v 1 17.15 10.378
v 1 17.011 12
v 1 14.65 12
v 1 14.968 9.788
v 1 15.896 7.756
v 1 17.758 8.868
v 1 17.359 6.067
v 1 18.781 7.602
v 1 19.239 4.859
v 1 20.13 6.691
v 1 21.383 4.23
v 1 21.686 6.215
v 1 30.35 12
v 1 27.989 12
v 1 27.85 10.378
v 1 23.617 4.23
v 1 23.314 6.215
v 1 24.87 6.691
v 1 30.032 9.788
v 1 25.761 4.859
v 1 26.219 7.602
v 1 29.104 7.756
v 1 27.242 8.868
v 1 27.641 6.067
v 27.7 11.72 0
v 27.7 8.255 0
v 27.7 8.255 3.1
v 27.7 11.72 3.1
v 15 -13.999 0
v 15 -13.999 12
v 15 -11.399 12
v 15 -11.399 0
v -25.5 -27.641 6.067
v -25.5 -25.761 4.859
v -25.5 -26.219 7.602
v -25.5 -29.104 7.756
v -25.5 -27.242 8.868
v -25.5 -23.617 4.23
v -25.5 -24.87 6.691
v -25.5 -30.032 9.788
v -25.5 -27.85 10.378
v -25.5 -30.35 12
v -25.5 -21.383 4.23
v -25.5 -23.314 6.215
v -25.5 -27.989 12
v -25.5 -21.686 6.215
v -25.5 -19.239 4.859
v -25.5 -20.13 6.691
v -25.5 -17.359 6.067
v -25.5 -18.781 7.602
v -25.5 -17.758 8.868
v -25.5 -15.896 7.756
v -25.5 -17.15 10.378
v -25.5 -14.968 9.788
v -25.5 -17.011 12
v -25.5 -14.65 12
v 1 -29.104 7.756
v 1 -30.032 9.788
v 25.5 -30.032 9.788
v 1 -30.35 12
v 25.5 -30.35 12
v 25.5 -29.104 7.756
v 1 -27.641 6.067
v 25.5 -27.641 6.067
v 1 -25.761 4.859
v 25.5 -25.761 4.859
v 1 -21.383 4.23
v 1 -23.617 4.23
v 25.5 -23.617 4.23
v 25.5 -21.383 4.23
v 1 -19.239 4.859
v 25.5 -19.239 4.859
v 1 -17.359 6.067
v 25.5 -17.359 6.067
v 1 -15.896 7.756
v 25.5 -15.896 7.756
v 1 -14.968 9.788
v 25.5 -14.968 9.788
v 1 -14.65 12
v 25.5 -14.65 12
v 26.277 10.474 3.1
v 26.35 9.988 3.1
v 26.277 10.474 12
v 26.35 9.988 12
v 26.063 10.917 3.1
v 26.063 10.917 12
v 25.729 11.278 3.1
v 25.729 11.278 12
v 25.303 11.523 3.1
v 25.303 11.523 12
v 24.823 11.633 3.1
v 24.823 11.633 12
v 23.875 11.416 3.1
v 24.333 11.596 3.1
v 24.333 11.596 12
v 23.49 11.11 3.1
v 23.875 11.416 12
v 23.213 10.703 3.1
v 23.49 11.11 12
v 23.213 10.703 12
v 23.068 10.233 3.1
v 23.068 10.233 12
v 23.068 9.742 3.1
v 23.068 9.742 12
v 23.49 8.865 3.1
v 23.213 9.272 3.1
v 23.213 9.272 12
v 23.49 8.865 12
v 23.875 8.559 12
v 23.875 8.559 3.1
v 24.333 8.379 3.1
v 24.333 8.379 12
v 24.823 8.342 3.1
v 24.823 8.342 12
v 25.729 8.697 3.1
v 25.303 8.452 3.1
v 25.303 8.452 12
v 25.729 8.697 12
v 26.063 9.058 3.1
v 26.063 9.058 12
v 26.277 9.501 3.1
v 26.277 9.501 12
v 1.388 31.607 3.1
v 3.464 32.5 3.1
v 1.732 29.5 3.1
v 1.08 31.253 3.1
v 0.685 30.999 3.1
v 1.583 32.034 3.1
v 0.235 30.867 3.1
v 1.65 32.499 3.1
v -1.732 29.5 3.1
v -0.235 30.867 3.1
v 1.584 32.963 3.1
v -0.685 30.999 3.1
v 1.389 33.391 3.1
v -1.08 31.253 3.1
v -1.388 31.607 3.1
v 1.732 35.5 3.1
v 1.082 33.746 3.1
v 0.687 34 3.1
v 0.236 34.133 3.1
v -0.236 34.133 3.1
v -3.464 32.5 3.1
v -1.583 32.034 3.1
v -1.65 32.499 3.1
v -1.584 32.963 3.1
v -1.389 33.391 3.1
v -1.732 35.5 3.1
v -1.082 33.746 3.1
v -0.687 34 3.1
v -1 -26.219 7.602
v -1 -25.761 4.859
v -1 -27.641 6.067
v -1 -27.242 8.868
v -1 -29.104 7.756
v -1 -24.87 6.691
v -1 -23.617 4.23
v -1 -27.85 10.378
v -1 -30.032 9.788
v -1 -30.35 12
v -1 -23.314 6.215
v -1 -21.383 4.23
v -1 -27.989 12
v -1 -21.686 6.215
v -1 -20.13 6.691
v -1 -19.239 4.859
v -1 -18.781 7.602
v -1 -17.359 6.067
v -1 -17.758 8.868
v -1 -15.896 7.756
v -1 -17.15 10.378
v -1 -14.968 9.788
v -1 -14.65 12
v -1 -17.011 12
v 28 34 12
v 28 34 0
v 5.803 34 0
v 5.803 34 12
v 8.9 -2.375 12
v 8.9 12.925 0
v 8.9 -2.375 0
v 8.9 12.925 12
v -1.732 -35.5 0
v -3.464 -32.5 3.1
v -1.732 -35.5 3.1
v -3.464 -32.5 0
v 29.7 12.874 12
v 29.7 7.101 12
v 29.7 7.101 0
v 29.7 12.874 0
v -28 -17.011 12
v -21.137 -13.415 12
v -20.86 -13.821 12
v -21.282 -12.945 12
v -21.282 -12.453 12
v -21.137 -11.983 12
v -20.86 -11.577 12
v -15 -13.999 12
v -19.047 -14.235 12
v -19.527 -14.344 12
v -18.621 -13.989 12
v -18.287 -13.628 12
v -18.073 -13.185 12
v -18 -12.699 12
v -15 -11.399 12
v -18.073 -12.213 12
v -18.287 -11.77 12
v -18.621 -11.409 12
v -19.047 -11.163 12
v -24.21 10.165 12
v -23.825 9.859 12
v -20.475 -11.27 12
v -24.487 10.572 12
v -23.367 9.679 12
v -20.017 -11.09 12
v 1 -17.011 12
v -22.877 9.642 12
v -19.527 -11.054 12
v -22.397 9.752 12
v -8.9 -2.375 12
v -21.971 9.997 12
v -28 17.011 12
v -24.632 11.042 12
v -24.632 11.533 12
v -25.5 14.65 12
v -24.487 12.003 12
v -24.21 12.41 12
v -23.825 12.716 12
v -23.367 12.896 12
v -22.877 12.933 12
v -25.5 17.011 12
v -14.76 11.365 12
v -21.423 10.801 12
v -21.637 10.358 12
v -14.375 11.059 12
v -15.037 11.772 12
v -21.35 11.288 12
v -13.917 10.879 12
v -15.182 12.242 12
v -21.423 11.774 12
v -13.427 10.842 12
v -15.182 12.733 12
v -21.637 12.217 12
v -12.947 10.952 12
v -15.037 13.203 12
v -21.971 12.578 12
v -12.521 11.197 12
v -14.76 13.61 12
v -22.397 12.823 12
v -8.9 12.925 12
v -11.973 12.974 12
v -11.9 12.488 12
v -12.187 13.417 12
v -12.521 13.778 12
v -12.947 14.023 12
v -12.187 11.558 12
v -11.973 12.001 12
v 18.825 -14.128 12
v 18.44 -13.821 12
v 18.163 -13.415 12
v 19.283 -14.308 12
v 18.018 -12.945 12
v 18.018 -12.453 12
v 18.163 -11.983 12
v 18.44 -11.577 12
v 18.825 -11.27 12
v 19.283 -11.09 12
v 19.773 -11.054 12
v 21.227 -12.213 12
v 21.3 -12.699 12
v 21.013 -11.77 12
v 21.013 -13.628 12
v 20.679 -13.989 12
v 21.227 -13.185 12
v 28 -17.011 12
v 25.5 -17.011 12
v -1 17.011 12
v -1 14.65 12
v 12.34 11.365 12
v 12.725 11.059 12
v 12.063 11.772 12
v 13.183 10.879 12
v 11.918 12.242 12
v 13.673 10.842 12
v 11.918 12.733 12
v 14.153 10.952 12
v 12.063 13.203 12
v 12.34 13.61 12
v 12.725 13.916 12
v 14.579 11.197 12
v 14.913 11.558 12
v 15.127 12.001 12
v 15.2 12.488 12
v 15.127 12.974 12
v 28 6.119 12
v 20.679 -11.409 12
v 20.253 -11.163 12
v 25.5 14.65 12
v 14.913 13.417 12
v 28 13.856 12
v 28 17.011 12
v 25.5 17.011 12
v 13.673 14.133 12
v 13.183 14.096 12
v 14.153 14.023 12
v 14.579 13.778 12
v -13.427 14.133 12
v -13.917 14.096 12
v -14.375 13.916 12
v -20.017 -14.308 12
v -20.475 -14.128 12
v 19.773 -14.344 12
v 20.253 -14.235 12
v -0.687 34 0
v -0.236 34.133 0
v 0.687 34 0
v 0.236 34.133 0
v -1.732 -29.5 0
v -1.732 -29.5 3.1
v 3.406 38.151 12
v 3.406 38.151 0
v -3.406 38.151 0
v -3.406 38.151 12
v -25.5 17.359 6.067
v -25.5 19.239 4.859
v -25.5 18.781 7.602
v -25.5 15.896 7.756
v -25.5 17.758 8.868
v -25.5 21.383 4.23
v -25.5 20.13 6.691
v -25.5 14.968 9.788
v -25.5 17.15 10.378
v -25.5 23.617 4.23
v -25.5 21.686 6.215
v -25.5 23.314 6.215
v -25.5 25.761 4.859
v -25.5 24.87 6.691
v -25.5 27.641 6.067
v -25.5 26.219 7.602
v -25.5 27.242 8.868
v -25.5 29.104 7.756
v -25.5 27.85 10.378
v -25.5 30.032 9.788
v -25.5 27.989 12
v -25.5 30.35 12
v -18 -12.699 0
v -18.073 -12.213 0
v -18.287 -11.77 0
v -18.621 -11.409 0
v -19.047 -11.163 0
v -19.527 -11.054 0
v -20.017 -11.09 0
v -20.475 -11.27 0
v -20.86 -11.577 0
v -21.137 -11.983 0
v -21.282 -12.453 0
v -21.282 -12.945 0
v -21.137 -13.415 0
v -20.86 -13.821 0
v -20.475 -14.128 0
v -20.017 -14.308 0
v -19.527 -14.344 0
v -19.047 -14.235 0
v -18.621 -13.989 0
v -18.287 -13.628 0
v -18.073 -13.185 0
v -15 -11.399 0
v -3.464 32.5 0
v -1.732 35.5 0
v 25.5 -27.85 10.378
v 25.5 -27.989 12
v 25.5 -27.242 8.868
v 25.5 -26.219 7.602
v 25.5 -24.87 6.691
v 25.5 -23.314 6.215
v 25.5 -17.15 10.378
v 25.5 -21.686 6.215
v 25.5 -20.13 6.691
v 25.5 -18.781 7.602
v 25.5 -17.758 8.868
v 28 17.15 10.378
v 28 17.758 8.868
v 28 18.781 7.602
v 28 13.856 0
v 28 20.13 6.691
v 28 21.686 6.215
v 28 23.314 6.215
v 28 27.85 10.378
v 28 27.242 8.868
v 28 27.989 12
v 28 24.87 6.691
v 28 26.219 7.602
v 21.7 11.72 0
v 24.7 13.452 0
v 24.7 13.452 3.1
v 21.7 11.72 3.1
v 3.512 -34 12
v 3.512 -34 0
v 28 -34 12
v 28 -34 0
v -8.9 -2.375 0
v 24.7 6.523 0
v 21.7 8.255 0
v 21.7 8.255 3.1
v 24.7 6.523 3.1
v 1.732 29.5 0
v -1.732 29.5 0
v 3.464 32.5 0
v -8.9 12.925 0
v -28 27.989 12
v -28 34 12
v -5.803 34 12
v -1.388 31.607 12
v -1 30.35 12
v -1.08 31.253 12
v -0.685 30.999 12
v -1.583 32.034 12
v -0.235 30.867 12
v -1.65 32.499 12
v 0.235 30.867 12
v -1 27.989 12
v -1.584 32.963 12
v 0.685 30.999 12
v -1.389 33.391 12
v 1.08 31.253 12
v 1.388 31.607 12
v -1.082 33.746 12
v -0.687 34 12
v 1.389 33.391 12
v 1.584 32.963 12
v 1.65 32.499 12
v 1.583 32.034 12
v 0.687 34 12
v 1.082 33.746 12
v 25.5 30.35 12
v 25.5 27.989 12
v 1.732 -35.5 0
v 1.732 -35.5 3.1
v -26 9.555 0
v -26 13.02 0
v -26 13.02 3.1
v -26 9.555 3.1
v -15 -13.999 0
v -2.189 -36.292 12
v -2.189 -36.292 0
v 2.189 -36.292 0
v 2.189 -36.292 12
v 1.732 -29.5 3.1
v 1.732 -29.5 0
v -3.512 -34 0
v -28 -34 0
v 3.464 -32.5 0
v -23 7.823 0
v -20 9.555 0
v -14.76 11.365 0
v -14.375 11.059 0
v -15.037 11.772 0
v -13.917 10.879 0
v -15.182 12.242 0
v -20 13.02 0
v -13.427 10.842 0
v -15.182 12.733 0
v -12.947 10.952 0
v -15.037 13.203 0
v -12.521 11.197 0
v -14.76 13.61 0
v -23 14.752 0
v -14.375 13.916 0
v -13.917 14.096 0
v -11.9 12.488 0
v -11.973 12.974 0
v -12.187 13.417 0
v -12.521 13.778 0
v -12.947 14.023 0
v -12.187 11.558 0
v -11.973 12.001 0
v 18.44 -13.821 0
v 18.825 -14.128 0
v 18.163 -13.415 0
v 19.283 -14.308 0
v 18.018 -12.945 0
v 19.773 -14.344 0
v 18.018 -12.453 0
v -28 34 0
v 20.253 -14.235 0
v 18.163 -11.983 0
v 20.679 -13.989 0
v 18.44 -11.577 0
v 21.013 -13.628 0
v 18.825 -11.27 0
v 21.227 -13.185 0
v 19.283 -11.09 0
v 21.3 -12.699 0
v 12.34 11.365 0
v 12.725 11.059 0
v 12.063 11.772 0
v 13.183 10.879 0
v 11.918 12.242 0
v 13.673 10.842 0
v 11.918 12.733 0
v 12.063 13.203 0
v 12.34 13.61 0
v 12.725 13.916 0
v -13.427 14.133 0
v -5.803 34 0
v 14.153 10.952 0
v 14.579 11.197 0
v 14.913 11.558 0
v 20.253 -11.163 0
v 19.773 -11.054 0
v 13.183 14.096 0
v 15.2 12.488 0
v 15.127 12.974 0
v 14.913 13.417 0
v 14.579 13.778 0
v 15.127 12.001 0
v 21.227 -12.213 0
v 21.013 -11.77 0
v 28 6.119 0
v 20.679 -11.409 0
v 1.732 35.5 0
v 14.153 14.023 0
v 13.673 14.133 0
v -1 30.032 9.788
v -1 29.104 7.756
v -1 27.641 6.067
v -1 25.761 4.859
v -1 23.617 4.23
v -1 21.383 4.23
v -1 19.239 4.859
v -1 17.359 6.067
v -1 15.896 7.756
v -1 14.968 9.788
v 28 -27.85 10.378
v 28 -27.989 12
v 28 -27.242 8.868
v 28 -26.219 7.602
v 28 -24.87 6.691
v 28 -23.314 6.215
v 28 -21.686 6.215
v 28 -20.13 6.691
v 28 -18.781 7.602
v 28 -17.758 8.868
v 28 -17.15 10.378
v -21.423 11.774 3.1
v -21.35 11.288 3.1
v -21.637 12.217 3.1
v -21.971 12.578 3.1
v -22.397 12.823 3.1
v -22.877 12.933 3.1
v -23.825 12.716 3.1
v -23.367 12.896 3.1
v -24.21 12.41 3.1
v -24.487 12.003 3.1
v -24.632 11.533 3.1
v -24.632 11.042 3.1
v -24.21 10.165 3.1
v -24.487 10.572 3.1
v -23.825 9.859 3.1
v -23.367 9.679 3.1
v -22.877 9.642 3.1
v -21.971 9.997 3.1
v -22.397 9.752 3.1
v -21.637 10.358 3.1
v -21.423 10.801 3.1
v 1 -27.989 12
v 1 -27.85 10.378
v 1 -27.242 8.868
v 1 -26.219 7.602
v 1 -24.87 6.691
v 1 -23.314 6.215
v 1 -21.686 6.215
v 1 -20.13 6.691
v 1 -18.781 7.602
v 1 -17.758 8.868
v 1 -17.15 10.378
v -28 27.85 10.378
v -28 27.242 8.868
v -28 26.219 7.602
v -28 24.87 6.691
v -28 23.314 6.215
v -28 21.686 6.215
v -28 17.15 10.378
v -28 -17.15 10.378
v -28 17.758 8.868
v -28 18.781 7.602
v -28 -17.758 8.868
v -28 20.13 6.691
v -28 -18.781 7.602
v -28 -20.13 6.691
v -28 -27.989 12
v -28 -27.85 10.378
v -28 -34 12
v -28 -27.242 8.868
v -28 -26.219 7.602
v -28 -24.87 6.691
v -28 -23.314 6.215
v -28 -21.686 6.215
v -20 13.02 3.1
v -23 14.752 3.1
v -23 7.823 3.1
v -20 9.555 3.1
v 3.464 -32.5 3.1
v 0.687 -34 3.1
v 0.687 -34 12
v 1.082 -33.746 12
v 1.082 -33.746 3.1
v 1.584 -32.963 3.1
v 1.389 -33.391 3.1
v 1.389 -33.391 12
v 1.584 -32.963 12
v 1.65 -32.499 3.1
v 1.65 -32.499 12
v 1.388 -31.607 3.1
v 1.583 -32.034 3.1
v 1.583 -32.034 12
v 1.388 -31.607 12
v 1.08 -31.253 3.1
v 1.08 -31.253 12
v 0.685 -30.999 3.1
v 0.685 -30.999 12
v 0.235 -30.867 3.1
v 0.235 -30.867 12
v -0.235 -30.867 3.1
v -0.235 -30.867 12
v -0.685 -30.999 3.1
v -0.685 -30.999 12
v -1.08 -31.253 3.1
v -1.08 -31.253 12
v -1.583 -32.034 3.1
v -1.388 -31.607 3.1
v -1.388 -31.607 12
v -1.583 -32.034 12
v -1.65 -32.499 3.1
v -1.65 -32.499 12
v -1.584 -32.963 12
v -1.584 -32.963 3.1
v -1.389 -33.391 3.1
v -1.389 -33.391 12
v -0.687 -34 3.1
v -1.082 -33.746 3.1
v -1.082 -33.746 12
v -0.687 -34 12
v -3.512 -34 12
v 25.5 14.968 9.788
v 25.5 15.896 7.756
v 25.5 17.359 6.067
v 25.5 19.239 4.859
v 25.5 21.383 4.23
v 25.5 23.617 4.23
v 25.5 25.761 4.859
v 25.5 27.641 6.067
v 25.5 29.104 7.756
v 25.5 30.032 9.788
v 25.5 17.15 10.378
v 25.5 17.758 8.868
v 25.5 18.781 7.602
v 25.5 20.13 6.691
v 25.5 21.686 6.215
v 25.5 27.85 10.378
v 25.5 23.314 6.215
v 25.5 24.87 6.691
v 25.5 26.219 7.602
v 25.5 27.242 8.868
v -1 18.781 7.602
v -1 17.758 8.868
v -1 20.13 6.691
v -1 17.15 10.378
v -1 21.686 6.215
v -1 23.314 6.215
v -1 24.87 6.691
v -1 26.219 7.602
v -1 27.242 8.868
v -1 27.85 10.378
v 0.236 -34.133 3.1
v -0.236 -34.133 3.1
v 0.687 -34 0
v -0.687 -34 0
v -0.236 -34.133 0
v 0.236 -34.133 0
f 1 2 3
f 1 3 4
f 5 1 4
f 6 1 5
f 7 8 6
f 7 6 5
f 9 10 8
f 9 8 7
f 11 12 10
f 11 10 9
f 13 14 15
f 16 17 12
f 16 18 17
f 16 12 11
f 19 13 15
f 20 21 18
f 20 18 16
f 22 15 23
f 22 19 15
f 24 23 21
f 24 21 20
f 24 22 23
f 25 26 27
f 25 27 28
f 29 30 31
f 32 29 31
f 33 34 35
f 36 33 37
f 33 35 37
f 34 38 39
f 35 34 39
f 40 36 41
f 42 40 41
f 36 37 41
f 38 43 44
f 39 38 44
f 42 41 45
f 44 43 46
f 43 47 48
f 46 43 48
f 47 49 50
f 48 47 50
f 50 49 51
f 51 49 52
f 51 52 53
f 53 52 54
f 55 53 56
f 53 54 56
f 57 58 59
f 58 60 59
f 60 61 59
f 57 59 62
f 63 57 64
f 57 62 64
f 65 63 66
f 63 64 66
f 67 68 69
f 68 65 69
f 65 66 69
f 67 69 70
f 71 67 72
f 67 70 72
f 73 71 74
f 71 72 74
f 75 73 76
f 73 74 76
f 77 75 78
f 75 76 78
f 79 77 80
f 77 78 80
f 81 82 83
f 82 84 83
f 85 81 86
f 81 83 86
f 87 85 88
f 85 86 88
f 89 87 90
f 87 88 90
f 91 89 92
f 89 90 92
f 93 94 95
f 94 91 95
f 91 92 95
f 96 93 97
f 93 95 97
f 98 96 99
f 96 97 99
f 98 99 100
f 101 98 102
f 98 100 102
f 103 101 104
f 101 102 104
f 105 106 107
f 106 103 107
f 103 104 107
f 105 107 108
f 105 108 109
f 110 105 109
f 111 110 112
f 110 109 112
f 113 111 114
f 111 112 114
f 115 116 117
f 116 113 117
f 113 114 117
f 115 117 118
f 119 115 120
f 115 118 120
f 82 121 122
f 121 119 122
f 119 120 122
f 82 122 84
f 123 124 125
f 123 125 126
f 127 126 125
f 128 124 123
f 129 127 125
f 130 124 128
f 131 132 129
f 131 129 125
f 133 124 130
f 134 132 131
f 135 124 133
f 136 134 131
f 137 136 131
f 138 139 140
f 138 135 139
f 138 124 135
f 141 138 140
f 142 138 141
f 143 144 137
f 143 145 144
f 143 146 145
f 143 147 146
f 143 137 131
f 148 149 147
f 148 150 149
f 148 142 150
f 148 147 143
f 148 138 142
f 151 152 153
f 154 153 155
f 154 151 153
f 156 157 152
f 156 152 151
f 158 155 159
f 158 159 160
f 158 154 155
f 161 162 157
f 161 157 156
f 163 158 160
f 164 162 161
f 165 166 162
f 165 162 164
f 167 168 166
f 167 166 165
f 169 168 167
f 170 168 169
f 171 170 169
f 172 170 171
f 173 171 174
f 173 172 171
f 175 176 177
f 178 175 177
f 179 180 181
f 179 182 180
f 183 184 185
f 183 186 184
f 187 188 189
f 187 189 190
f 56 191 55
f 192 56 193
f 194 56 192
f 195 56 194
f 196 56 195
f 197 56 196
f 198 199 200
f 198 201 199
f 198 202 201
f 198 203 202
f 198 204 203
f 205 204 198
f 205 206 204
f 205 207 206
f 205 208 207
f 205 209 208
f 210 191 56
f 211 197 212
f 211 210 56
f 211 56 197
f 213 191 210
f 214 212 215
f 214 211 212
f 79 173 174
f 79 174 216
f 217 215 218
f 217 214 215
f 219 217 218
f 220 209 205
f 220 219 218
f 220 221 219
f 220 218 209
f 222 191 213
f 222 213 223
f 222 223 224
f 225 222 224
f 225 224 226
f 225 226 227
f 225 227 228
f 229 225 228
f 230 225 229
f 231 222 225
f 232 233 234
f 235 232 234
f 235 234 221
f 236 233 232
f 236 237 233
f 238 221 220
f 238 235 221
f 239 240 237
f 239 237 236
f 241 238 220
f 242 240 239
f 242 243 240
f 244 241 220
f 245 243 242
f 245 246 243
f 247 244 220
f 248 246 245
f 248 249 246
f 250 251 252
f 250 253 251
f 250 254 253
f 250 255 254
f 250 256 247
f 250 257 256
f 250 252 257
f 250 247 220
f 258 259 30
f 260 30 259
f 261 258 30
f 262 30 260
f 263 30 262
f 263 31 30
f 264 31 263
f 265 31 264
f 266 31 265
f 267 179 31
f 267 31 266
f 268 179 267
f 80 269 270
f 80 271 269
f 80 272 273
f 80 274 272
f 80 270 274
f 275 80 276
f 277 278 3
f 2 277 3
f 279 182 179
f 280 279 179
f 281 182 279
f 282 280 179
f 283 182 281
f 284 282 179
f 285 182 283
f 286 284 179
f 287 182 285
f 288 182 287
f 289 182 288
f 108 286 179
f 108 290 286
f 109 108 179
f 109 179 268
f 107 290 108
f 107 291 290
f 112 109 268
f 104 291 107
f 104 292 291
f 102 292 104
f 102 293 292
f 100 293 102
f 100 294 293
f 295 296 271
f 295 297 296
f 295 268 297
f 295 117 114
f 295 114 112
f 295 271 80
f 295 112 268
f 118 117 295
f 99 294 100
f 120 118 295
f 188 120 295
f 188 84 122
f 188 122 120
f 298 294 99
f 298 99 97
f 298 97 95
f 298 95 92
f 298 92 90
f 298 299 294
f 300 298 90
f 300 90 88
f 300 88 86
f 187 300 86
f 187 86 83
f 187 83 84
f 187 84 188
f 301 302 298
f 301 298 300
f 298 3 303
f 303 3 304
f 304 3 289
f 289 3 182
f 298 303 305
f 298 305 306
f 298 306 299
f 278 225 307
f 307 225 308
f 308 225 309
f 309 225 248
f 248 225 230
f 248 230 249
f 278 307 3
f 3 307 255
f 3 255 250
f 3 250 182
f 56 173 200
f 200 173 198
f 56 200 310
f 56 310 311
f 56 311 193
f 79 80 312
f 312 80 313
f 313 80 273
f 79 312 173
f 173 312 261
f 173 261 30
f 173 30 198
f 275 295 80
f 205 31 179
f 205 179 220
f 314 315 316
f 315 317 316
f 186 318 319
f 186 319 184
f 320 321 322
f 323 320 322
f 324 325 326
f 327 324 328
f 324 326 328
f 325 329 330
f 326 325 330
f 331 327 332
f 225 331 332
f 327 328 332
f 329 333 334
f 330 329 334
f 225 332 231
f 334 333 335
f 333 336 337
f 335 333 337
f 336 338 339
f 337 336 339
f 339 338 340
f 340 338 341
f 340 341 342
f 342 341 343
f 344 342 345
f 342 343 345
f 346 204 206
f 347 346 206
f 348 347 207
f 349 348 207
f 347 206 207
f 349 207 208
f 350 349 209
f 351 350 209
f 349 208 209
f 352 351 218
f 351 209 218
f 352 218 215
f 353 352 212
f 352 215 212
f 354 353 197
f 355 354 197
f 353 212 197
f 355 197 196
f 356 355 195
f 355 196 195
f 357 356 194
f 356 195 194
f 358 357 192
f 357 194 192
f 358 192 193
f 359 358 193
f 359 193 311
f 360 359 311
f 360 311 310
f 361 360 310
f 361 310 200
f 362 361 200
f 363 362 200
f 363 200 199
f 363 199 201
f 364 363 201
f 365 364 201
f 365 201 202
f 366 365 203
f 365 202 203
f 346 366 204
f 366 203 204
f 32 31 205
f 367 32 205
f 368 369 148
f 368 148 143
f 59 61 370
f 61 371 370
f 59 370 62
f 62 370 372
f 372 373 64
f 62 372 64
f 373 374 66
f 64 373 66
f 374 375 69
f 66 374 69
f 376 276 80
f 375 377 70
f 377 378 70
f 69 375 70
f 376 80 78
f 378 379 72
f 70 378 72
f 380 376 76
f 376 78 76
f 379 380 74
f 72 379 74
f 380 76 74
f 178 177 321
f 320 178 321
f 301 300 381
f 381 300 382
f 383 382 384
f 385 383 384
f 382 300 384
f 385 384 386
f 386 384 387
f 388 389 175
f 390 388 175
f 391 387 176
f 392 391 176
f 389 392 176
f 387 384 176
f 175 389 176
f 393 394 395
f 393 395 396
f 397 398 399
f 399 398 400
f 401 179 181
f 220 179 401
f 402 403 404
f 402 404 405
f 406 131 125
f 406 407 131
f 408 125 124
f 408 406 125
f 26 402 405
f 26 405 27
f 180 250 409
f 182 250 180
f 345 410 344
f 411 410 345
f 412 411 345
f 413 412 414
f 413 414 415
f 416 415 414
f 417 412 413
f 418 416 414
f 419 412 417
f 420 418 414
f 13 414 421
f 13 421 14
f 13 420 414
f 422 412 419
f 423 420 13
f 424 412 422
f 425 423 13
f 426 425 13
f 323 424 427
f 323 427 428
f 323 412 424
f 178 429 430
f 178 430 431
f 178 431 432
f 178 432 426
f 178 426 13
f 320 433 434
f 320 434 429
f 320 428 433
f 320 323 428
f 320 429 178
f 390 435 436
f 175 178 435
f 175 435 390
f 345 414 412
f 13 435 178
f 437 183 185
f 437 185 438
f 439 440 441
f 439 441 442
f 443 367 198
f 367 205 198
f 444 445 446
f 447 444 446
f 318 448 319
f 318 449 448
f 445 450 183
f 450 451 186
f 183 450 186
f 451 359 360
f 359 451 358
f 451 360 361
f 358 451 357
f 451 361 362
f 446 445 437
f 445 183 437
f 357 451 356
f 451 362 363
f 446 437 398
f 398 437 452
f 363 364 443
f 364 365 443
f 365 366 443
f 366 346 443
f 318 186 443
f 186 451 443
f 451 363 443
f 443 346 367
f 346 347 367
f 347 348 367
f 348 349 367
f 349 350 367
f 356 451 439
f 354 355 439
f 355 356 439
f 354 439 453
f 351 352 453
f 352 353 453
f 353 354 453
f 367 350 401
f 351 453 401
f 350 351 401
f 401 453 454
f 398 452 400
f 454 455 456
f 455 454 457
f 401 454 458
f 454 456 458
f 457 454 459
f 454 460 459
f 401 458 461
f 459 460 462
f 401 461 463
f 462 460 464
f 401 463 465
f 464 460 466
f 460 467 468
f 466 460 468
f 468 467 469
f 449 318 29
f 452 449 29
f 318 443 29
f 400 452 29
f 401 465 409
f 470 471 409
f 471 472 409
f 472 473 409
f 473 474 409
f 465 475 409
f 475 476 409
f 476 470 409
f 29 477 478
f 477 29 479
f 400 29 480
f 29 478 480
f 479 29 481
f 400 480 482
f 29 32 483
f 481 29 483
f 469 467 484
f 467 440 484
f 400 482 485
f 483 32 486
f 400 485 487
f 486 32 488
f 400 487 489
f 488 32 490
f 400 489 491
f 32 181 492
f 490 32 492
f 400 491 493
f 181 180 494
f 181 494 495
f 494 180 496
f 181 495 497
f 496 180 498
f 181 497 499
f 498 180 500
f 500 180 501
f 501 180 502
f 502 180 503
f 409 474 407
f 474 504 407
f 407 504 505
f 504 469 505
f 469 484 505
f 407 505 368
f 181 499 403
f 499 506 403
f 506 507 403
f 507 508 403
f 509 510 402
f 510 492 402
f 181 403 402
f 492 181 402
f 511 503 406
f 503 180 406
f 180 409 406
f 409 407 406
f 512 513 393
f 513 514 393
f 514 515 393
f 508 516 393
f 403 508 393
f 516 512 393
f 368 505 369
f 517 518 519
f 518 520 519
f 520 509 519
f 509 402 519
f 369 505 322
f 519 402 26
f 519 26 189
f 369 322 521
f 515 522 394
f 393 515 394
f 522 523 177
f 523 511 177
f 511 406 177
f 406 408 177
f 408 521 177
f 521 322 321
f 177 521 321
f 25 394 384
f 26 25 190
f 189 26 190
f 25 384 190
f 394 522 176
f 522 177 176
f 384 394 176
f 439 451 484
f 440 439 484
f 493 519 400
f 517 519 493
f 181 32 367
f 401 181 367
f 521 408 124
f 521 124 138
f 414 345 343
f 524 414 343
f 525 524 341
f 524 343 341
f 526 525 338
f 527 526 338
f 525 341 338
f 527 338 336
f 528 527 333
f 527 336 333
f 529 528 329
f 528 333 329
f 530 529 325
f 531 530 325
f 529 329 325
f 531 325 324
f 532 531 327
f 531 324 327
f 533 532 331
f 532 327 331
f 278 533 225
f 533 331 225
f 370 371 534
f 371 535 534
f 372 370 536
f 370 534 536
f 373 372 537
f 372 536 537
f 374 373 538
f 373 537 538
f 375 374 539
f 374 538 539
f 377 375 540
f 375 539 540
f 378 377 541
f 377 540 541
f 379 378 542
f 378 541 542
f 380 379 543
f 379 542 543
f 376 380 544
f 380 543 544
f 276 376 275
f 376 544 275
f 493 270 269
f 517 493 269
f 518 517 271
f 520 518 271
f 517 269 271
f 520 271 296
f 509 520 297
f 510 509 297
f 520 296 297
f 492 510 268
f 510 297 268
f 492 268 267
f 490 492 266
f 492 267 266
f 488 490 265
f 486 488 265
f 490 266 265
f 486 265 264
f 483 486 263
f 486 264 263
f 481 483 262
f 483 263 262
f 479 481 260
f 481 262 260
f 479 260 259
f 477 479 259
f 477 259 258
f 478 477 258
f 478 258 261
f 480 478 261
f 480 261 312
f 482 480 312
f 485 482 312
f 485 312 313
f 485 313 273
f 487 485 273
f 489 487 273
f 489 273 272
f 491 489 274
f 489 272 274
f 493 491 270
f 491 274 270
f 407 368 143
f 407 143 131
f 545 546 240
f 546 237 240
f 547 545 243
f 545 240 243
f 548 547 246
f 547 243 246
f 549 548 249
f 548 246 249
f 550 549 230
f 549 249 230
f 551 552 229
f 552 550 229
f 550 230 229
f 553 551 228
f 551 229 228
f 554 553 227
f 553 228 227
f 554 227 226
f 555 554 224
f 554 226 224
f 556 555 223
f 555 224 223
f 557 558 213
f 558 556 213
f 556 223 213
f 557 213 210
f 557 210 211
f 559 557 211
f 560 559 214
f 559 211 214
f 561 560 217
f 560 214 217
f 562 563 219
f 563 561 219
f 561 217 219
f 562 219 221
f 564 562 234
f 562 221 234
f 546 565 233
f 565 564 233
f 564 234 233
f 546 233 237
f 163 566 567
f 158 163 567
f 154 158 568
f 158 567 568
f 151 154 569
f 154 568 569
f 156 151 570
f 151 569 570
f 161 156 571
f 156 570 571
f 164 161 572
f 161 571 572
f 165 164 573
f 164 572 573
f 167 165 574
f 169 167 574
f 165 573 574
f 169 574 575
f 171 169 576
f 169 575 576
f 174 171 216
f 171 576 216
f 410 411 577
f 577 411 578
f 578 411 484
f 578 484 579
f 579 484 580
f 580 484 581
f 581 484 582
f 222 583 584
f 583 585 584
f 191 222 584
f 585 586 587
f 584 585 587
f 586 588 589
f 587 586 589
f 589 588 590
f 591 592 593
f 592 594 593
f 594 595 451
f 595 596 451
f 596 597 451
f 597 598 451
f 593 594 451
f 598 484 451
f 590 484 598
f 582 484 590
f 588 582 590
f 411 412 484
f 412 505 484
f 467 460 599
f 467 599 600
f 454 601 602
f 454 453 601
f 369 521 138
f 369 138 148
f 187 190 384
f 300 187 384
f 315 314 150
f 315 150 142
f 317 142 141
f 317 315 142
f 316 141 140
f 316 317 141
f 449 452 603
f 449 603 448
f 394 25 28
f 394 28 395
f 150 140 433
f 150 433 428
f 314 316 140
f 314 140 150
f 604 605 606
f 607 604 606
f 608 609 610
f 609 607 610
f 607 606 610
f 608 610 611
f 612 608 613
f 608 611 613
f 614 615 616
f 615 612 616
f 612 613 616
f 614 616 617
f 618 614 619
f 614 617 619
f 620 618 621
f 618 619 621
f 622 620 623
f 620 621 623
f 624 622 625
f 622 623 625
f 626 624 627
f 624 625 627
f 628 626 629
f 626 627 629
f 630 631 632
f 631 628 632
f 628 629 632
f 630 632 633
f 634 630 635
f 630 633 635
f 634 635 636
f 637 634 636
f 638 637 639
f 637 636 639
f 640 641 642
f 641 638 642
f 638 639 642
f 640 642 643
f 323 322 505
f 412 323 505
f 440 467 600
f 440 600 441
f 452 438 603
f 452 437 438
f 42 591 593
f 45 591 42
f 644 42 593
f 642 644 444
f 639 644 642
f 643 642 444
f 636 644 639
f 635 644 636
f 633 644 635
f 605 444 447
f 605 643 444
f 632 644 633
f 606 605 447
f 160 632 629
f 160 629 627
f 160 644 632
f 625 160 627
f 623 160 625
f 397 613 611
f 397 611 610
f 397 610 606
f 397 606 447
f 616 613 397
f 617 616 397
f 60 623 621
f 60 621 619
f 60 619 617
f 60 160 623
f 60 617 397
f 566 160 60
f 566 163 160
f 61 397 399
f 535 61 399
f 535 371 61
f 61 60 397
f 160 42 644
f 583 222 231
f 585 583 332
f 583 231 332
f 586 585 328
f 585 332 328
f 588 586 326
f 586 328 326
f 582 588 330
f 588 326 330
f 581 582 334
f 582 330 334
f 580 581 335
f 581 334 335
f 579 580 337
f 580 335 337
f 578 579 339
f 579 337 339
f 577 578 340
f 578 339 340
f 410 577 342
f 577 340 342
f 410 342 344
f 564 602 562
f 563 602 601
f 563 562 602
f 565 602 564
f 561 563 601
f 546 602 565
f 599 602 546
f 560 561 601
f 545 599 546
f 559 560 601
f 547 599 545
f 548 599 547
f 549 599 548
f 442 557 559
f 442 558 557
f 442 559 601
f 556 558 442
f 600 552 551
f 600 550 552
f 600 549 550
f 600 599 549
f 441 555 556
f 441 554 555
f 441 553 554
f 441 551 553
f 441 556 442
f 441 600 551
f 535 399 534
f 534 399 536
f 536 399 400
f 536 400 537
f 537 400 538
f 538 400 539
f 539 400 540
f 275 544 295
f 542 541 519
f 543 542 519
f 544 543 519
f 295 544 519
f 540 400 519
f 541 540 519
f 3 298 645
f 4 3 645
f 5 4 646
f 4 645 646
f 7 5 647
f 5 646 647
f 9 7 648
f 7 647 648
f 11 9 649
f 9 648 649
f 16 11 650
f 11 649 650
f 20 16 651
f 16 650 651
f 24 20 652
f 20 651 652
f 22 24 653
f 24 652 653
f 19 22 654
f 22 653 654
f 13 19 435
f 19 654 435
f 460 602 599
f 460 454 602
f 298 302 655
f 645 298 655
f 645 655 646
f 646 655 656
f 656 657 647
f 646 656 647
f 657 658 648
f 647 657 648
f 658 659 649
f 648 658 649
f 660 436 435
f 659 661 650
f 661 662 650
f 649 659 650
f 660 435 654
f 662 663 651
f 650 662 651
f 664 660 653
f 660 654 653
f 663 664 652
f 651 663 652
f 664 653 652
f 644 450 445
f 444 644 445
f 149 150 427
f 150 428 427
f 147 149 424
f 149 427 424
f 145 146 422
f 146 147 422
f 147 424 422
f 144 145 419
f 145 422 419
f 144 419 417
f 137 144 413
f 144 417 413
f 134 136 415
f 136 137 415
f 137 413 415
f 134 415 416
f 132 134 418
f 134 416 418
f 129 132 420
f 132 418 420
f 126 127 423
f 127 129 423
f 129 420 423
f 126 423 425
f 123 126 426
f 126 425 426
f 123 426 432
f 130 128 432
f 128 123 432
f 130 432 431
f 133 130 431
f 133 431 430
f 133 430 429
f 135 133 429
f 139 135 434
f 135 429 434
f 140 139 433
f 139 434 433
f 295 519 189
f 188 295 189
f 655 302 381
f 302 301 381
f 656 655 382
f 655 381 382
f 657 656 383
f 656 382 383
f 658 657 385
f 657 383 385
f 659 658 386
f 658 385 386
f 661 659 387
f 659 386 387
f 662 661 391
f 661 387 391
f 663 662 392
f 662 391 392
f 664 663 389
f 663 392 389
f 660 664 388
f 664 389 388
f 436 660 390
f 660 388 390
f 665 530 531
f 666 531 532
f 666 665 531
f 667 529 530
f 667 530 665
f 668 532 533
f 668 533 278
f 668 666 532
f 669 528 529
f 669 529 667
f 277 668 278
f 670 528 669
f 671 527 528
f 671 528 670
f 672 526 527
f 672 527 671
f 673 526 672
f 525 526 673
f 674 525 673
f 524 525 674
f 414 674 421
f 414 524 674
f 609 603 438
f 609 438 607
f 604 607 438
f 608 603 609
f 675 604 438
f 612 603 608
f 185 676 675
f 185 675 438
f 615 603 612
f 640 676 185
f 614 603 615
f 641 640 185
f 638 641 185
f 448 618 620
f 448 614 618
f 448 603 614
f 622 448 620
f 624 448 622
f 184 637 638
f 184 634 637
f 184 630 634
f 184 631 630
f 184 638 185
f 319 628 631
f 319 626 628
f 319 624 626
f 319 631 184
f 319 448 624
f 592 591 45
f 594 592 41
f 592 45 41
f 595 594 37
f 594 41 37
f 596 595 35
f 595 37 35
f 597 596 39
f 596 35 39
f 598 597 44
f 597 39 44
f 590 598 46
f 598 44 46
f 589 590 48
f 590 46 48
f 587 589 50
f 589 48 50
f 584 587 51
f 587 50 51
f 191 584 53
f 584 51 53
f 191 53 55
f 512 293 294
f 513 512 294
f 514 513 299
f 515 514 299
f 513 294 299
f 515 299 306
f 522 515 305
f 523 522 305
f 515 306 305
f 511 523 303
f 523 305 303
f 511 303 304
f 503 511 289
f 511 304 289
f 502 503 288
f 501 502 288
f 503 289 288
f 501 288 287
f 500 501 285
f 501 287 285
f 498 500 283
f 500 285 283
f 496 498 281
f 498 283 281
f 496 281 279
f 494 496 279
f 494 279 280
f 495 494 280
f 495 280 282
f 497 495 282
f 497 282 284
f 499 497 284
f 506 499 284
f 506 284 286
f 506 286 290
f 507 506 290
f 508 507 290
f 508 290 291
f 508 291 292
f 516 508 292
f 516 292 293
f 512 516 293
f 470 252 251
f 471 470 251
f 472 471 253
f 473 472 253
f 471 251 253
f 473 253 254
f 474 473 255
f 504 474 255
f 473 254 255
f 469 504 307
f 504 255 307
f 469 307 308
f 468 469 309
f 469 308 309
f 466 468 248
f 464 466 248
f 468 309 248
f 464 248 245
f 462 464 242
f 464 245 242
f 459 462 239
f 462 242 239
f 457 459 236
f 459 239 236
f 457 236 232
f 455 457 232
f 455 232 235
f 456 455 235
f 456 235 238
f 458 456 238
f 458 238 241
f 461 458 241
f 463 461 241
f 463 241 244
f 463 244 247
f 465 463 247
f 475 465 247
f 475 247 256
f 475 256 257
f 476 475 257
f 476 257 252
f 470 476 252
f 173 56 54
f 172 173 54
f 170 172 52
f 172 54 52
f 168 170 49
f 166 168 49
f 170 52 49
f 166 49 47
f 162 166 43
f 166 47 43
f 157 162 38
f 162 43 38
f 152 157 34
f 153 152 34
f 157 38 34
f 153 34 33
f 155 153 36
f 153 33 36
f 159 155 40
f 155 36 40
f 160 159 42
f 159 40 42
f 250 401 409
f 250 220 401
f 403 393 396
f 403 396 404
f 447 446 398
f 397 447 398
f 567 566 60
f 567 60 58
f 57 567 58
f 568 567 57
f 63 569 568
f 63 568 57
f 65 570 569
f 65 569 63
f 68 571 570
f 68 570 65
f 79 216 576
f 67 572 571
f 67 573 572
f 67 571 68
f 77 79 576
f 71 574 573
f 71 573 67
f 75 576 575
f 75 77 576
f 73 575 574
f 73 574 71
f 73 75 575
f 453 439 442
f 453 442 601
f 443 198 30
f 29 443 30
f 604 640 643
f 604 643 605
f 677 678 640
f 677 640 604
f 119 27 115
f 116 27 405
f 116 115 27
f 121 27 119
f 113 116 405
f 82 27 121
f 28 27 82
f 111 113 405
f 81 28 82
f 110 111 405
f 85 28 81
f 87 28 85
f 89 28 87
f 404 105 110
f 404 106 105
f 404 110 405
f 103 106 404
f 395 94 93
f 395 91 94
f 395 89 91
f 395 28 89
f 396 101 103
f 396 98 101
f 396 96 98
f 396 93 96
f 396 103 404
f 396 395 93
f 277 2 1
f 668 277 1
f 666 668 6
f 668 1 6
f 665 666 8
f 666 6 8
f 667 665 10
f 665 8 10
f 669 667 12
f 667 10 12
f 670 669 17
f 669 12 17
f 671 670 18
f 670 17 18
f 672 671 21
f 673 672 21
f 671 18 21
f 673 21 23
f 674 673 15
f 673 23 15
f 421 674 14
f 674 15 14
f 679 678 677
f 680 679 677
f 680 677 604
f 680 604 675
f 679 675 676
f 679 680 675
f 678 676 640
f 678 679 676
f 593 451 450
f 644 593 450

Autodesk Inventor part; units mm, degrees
ref_plane "YZ Plane" through (0, 0, 0) normal (1, 0, 0) x (0, 1, 0)
ref_plane "XZ Plane" through (0, 0, 0) normal (0, 1, 0) x (-1, 0, 0)
ref_plane "XY Plane" through (0, 0, 0) normal (0, 0, 1) x (1, 0, 0)
sketch "Sketch1" plane through (0, 0, 0) normal (0, 0, 1) x (1, 0, 0)
  line L0 (-28, -34) -> (28, -34)
  line L1 (28, -34) -> (28, 34)
  line L2 (28, 34) -> (-28, 34)
  line L3 (-28, 34) -> (-28, -34)
  line L4 (-28, -34) -> (28, 34) construction
  line L5 (28, -34) -> (-28, 34) construction
  point P0 (0, 0)
  dimension "d0" = 56
  dimension "d1" = 68
extrude "Extrusion1" add sketch "Sketch1" along normal blind 12
sketch "Sketch2" plane through (28, -34, 0) normal (1, 0, 0) x (0, 0, -1)
  line L0 (0, 34) -> (-11.654, 34)
  line L1 (-11.654, 34) -> (-11.654, 11.5)
  line L2 (-11.654, 34) -> (-11.654, 56.5)
  circle A0 centre (-11.654, 11.5) radius 5.5
  circle A1 centre (-11.654, 56.5) radius 5.5
  dimension "d4" = 22.5
  dimension "d5" = 11
  dimension "d6" = 11
extrude "Extrusion2" cut sketch "Sketch2" against normal up to surface (56 mm away)
ref_plane "Work Plane1" through (25.5, -34, 0) normal (1, 0, 0) x (0, 0, -1)
sketch "Sketch3" plane through (25.5, -34, 0) normal (1, 0, 0) x (0, 0, -1)
  line L0 (-12, 51.0109) -> (-12, 16.9891) projected
  line L1 (-12, 61.9891) -> (-12, 68) projected
  line L2 (-12, 51.0109) -> (-12, 61.9891)
  line L3 (-12, 16.9891) -> (-12, 6.0109)
  circle A0 centre (-12, 11.5) radius 7.85
  circle A1 centre (-12, 56.5) radius 7.85
  point P0 (0, 34)
  dimension "d9" = 15.7
  dimension "d10" = 15.7
extrude "Extrusion3" cut sketch "Sketch3" against normal blind 24.5
ref_plane "Work Plane2" through (0, -34, 0) normal (1, 0, 0) x (0, 0, -1)
mirror "Mirror1" about plane through (0, -34, 0) normal (1, 0, 0) of "Extrusion3"
sketch "Sketch10" plane through (0, 0, 12) normal (0, 0, 1) x (1, 0, 0)
  line L0 (-8.9, 12.925) -> (8.9, 12.925)
  line L1 (8.9, 14.65) -> (8.9, -2.375)
  line L2 (8.9, -2.375) -> (-8.9, -2.375)
  line L3 (-8.9, -2.375) -> (-8.9, 12.925)
  line L4 (10.4, -4.375) -> (-10.4, -4.375) projected
  line L5 (10.4, 10.325) -> (10.4, -4.375) projected
  line L6 (-10.4, -4.375) -> (-10.4, 10.325) projected
  line L7 (-1, 14.65) -> (-25.5, 14.65) projected
  line L8 (-28, 17.0109) -> (-28, -17.0109) projected
  line L9 (28, -17.0109) -> (28, 17.0109) projected
  line L10 (-28, 10.325) -> (28, 10.325) projected
  line L11 (25.5, 14.65) -> (1, 14.65) projected
  line L12 (-1, -15.073) -> (1, -15.073)
  line L13 (0, -15.073) -> (0, -10.325)
  line L14 (28, -10.325) -> (-28, -10.325) projected
  line L15 (-15, -13.999) -> (15, -13.999)
  line L16 (15, -13.999) -> (15, -11.399)
  line L17 (15, -11.399) -> (-15, -11.399)
  line L18 (-15, -11.399) -> (-15, -13.999)
  line L19 (-15, -13.999) -> (15, -11.399) construction
  line L20 (15, -13.999) -> (-15, -11.399) construction
  line L21 (1, -14.65) -> (25.5, -14.65) projected
  point P0 (0, 0)
  point P1 (-28, 6.925)
  point P2 (28, 4.325)
  point P3 (21.4, 10.325)
  point P4 (0, -12.699)
  dimension "d82" = 2
  dimension "d83" = 1.5
  dimension "d84" = 1.5
  dimension "d105" = 15.3
  dimension "d116" = 2.6
  dimension "d117" = 30
  dimension "d152" = 0.651
extrude "Extrusion9" cut sketch "Sketch10" against normal up to surface (12 mm away) contours L17 L16 L15 L13 | L13 L15 L18 L17 | L0 L1 L10 L3 | L10 L1 L2 L3
sketch "Sketch12" plane through (0, 0, 12) normal (0, 0, 1) x (1, 0, 0)
  line L0 (-28, 10.325) -> (28, 10.325) projected
  line L1 (-10.4, 10.325) -> (-8.9, 10.325)
  line L2 (-8.9, 12.925) -> (-8.9, -2.375) projected
  line L3 (-1, 14.65) -> (-25.5, 14.65) projected
  line L4 (-8.9, 14.65) -> (-8.9, 10.325)
  line L5 (-8.9, 12.4875) -> (-13.55, 12.4875) construction
  circle A0 centre (-13.55, 12.4875) radius 1.65
  line L6 (28, -17.0109) -> (28, 17.0109) construction
  line L7 (28, 5.325) -> (21.4, 5.325) construction
  line L8 (21.4, 5.325) -> (21.4, 14.65) construction
  line L9 (21.4, 14.65) -> (28, 14.65) construction
  line L10 (28, 14.65) -> (28, 5.325) construction
  line L11 (21.4, 5.825) -> (21.4, 10.325) construction
  line L12 (25.5, 14.65) -> (1, 14.65) projected
  line L13 (21.4, 14.65) -> (28, 5.325) construction
  circle A1 centre (24.7, 9.9875) radius 1.65
  line L14 (-28, -34) -> (28, -34) projected
  line L15 (0, -34) -> (0, 34)
  circle A2 centre (13.55, 12.4875) radius 1.65
  line L16 (-15, -11.399) -> (-15, -13.999) projected
  line L17 (-15, -12.699) -> (-19.65, -12.699) construction
  circle A3 centre (-19.65, -12.699) radius 1.65
  circle A4 centre (19.65, -12.699) radius 1.65
  line L18 (-28, 7.925) -> (-18, 7.925) construction
  line L19 (-18, 7.925) -> (-18, 14.65) construction
  line L20 (-18, 14.65) -> (-28, 14.65) construction
  line L21 (-28, 14.65) -> (-28, 7.925) construction
  line L22 (-18, 10.325) -> (-18, 8.425) construction
  line L23 (-28, 14.65) -> (-18, 7.925) construction
  circle A5 centre (-23, 11.2875) radius 1.65
  line L24 (-28, 30.85) -> (28, 30.85) construction
  circle A6 centre (0, 32.5) radius 1.65
  line L25 (-25.5, 30.35) -> (-1, 30.35) projected
  line L26 (28, -34) -> (28, 34) projected
  line L27 (28, 0) -> (-28, 0)
  line L28 (-28, -30.85) -> (28, -30.85) construction
  circle A7 centre (0, -32.5) radius 1.65
  point P0 (0, 0)
  dimension "d118" = 4.65
  dimension "d119" = 3.3
  dimension "d121" = 3.3
  dimension "d122" = 4.65
  dimension "d123" = 3.3
  dimension "d124" = 3.3
  dimension "d125" = 3.3
  dimension "d126" = 0.5
extrude "Extrusion11" cut sketch "Sketch12" against normal up to surface (12 mm away) contours A6 | A5 L0 | L0 A5 | A1 L0 | L0 A1 | A7 L14 L15 | L15 L14 A7 | L14 A7 | A0 | A2 | A3 | A4
sketch "Sketch13" plane through (0, 0, 0) normal (0, 0, -1) x (-1, 0, 0)
  line L0 (3.4064, 38.1506) -> (5.8027, 34)
  line L1 (-5.8027, 34) -> (-3.4064, 38.1506)
  line L2 (-3.4064, 38.1506) -> (3.4064, 38.1506)
  line L3 (0, 34) -> (0, 32.2506)
  line L4 (-28, 34) -> (28, 34) projected
  line L5 (-28, 34) -> (28, 34) projected
  line L6 (-5.8027, 34) -> (5.8027, 34)
  line L7 (-28, -34) -> (-28, 34) projected
  line L8 (-28, 0) -> (28, 0)
  circle A0 centre (-24.7, 9.9875) radius 1.65 projected
  line L9 (-29.7, 12.8743) -> (-24.7, 15.761)
  line L10 (-24.7, 15.761) -> (-19.7, 12.8743)
  line L11 (-19.7, 12.8743) -> (-19.7, 7.1007)
  line L12 (-19.7, 7.1007) -> (-24.7, 4.214)
  line L13 (-24.7, 4.214) -> (-29.7, 7.1007)
  line L14 (-29.7, 7.1007) -> (-29.7, 12.8743)
  line L15 (-28, 13.8557) -> (-28, 6.1193)
  circle A1 centre (0, -32.5) radius 1.65 projected
  line L16 (-2.189, -36.2915) -> (-3.512, -34)
  line L17 (3.512, -34) -> (2.189, -36.2915)
  line L18 (2.189, -36.2915) -> (-2.189, -36.2915)
  line L19 (28, -34) -> (-28, -34) projected
  line L20 (-3.512, -34) -> (3.512, -34)
  point P0 (0, 0)
  dimension "d131" = 1.7494
  dimension "d142" = 10
extrude "Extrusion12" add sketch "Sketch13" against normal up to surface (12 mm away) contours L19 A1 L17 L18 L16 | L7 L13 L14 L9 | L0 L4 L1 L2 | L19 A1 picked at (-0.1173, -34.0374)
sketch "Sketch14" plane through (0, 0, 0) normal (0, 0, -1) x (-1, 0, 0)
  circle A0 centre (0, 32.5) radius 1.65 projected
  line L0 (-1.65, 32.5) -> (1.65, 32.5) construction
  line L1 (1.7321, 35.5) -> (3.4641, 32.5)
  line L2 (3.4641, 32.5) -> (1.7321, 29.5)
  line L3 (1.7321, 29.5) -> (-1.7321, 29.5)
  line L4 (-1.7321, 29.5) -> (-3.4641, 32.5)
  line L5 (-3.4641, 32.5) -> (-1.7321, 35.5)
  line L6 (-1.7321, 35.5) -> (1.7321, 35.5)
  circle A1 centre (23, 11.2875) radius 1.65 projected
  line L7 (26, 9.5554) -> (23, 7.8234)
  line L8 (23, 7.8234) -> (20, 9.5554)
  line L9 (20, 9.5554) -> (20, 13.0196)
  line L10 (20, 13.0196) -> (23, 14.7516)
  line L11 (23, 14.7516) -> (26, 13.0196)
  line L12 (26, 13.0196) -> (26, 9.5554)
  circle A2 centre (-24.7, 9.9875) radius 1.65 projected
  line L13 (-27.7, 11.7196) -> (-24.7, 13.4516)
  line L14 (-24.7, 13.4516) -> (-21.7, 11.7196)
  line L15 (-21.7, 11.7196) -> (-21.7, 8.2554)
  line L16 (-21.7, 8.2554) -> (-24.7, 6.5234)
  line L17 (-24.7, 6.5234) -> (-27.7, 8.2554)
  line L18 (-27.7, 8.2554) -> (-27.7, 11.7196)
  circle A3 centre (0, -32.5) radius 1.65 projected
  line L19 (1.7321, -29.5) -> (3.4641, -32.5)
  line L20 (3.4641, -32.5) -> (1.7321, -35.5)
  line L21 (1.7321, -35.5) -> (-1.7321, -35.5)
  line L22 (-1.7321, -35.5) -> (-3.4641, -32.5)
  line L23 (-3.4641, -32.5) -> (-1.7321, -29.5)
  line L24 (-1.7321, -29.5) -> (1.7321, -29.5)
  point P0 (0, 0)
  dimension "d138" = 6
  dimension "d139" = 6
  dimension "d140" = 6
  dimension "d141" = 6
extrude "Extrusion13" cut sketch "Sketch14" against normal blind 3.1
properties part number "custom"
